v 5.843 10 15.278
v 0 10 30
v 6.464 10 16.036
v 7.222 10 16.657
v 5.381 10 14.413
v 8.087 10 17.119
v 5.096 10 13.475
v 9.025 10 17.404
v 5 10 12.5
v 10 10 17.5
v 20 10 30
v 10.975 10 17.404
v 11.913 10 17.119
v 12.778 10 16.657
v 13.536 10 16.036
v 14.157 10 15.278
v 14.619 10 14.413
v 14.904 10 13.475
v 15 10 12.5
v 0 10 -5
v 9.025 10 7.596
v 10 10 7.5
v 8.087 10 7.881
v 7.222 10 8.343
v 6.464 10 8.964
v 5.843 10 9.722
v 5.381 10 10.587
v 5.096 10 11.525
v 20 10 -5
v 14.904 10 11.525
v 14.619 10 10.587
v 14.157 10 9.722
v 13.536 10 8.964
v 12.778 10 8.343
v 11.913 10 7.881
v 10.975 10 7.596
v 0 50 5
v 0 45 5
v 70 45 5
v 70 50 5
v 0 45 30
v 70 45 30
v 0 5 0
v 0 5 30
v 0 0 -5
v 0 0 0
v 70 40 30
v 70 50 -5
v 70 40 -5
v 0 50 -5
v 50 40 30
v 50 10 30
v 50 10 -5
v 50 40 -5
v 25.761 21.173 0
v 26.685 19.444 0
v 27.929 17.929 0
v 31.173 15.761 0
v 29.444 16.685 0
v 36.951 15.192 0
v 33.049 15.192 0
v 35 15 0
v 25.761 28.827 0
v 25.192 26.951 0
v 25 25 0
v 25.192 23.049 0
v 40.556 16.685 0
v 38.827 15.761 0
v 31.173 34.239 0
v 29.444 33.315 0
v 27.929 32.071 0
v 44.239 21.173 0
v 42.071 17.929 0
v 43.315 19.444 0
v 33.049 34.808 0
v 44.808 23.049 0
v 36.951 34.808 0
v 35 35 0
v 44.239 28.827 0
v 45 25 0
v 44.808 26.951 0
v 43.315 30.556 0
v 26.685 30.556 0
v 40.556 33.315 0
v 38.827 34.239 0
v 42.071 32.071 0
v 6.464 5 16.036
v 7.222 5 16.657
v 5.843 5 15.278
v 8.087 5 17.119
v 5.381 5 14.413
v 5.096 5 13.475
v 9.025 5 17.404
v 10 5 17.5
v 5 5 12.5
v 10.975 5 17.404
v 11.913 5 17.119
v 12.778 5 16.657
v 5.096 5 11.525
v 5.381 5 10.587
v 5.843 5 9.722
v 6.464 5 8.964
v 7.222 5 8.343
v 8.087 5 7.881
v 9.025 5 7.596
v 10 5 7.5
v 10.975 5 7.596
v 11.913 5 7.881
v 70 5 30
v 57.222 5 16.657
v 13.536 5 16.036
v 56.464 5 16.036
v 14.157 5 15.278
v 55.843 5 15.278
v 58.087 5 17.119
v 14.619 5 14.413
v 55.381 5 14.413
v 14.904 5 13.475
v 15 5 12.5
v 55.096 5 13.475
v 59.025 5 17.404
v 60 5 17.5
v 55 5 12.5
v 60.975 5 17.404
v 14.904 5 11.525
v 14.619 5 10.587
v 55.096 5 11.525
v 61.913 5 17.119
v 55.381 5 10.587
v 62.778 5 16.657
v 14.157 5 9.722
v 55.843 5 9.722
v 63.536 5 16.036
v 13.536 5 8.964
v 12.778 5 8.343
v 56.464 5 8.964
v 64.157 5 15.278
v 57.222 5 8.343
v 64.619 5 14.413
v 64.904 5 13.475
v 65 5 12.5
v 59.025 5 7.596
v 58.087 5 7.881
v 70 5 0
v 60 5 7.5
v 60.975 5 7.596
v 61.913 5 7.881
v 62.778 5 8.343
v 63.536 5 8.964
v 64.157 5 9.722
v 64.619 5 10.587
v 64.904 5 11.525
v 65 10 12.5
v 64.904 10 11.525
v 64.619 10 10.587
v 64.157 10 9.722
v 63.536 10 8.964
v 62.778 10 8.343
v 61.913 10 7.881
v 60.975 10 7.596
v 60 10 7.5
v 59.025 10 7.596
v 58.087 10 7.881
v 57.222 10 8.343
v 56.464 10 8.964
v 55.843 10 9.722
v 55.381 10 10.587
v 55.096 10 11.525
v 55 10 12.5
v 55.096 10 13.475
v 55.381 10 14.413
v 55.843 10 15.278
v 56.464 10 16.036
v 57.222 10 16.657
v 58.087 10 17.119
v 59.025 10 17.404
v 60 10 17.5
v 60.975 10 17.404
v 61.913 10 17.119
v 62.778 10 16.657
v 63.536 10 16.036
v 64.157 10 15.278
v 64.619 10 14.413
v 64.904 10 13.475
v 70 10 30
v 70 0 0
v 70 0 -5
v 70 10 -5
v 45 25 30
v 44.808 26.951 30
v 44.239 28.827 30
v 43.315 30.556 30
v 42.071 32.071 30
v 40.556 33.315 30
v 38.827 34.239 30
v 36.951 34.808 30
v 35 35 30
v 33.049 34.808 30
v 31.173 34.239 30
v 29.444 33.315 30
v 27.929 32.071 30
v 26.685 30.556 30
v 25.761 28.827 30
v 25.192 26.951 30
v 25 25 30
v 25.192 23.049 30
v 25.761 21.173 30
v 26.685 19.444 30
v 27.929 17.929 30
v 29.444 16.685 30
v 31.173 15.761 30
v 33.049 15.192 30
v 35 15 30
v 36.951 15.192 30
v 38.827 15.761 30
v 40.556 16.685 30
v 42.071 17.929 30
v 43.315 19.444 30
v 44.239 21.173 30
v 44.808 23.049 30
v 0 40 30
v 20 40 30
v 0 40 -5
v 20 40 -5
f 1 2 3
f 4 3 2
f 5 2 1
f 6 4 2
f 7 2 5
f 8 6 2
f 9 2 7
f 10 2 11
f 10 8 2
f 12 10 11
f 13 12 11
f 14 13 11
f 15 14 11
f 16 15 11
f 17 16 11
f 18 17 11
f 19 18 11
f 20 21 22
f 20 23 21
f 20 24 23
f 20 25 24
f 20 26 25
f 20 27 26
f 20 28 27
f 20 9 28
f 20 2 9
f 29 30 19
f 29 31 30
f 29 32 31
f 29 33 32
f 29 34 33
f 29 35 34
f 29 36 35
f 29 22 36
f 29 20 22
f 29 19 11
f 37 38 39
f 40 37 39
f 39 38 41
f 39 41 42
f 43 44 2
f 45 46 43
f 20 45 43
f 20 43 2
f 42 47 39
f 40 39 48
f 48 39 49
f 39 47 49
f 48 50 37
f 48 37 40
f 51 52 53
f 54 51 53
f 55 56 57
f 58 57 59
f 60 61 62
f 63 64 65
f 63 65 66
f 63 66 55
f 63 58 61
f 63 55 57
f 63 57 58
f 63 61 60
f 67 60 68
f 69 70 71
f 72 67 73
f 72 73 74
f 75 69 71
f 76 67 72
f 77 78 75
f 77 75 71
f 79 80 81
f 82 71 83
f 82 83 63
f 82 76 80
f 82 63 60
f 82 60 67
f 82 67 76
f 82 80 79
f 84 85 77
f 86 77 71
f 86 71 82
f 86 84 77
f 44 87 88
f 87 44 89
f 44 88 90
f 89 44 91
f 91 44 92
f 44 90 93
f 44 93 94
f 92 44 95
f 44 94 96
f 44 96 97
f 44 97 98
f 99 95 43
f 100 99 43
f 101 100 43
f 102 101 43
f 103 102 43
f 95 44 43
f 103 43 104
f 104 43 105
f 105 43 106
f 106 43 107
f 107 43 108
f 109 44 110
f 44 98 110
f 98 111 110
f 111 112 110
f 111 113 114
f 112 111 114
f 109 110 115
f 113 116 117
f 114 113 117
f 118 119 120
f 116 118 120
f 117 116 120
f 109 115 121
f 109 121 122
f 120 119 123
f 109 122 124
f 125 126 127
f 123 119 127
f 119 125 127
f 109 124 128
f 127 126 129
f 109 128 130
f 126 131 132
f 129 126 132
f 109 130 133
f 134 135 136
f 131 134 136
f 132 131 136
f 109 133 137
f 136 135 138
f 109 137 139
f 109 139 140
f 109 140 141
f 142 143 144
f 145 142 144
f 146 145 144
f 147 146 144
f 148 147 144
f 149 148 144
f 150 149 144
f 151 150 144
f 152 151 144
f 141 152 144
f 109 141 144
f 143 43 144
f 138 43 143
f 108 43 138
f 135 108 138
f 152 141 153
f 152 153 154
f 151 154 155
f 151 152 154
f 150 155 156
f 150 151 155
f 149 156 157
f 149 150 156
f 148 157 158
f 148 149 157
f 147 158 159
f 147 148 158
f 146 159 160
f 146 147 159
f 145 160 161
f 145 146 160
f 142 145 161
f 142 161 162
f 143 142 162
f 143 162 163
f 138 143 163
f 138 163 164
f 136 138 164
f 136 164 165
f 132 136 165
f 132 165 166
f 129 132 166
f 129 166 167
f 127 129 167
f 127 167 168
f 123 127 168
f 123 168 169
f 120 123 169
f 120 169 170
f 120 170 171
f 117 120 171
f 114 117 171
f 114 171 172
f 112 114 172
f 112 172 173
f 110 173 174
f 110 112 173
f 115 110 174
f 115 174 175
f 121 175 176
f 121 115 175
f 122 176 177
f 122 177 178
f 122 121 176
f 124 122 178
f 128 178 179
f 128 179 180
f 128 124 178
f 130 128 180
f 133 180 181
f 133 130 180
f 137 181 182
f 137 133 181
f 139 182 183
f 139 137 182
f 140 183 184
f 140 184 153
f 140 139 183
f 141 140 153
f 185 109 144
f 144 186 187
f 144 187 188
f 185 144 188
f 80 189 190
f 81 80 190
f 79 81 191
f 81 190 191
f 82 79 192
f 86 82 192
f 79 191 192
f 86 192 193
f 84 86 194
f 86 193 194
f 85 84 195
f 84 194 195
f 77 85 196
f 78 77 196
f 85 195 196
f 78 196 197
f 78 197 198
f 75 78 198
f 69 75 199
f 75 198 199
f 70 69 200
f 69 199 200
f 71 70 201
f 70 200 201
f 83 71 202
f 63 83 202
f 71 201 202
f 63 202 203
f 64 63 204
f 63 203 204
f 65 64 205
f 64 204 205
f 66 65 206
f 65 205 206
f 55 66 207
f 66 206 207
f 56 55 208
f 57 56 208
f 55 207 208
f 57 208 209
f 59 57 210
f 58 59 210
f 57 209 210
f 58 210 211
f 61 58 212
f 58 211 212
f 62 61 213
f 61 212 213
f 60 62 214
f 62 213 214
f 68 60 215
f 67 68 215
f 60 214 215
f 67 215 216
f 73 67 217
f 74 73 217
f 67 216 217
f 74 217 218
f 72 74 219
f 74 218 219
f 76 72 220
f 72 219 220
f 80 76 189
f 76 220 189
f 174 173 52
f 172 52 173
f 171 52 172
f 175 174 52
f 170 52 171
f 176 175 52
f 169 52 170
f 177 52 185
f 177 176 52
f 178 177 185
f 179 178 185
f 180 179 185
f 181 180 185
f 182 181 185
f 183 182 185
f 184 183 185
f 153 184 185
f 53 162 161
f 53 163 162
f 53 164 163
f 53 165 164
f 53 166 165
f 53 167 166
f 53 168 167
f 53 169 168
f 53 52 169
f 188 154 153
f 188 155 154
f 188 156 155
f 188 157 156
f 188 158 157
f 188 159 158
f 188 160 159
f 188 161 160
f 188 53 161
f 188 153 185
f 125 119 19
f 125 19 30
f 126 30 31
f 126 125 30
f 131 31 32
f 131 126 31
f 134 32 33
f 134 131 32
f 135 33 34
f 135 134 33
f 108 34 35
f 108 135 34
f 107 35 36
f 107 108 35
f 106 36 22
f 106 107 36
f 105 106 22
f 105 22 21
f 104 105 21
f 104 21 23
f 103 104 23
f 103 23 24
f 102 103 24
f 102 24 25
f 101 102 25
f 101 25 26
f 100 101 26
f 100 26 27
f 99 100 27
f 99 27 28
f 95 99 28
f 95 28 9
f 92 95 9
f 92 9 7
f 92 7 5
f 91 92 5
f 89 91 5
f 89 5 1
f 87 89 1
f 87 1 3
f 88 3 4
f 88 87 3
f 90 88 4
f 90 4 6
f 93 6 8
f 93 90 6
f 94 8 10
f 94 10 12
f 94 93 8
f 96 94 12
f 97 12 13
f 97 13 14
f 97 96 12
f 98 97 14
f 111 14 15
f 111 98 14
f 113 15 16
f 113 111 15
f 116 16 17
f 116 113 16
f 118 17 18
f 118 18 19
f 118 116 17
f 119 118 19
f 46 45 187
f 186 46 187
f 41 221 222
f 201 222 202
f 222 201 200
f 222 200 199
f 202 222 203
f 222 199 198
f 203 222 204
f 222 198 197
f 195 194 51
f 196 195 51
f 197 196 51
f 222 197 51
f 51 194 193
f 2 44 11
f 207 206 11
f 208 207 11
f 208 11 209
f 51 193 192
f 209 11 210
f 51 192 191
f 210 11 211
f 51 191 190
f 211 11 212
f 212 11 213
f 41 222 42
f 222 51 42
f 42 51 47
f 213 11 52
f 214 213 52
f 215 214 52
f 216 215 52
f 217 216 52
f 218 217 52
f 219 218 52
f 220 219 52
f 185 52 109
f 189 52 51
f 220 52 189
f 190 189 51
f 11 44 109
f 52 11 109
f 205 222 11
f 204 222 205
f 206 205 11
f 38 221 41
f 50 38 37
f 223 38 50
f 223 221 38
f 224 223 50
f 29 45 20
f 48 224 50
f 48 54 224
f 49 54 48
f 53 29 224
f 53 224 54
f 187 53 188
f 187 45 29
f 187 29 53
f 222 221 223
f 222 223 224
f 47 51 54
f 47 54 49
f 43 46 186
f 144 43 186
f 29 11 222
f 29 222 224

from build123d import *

# Parameters (mm, degrees)
SKETCH1_W           = 70
SKETCH1_H           = 5
BOSS_EXTRUDE1_DEPTH = 10
SKETCH2_W           = 70
SKETCH2_H           = 5
BOSS_EXTRUDE2_DEPTH = 30
SKETCH3_R           = 5
CUT_EXTRUDE2_DEPTH  = 10
SKETCH4_R           = 5
CUT_EXTRUDE3_DEPTH  = 10
SKETCH6_W           = 30
SKETCH6_H           = 35
BOSS_EXTRUDE4_DEPTH = 30
BOSS_EXTRUDE5_DEPTH = 5
SKETCH8_W           = 70
SKETCH8_H           = 10
BOSS_EXTRUDE6_DEPTH = 5
SKETCH9_R           = 10
CUT_EXTRUDE4_DEPTH  = 30


with BuildPart() as part:
    # Sketch1 → Boss-Extrude1 (new body)
    with BuildSketch(Plane(origin=(0, 0, 0), x_dir=(1, 0, 0), z_dir=(0, 1, 0))):
        with Locations((35, 2.5)):
            Rectangle(SKETCH1_W, SKETCH1_H)
    extrude(amount=BOSS_EXTRUDE1_DEPTH)

    # Sketch2 → Boss-Extrude2 (add)
    with BuildSketch(Plane.XY):
        with Locations((35, 7.5)):
            Rectangle(SKETCH2_W, SKETCH2_H)
    extrude(amount=BOSS_EXTRUDE2_DEPTH)

    # Sketch3 → Cut-Extrude2 (cut)
    with BuildSketch(Plane(origin=(0, 0, 0), x_dir=(1, 0, 0), z_dir=(0, 1, 0))):
        with Locations((60, -12.5)):
            Circle(SKETCH3_R)
    extrude(amount=CUT_EXTRUDE2_DEPTH, mode=Mode.SUBTRACT)

    # Sketch4 → Cut-Extrude3 (cut)
    with BuildSketch(Plane(origin=(0, 0, 0), x_dir=(1, 0, 0), z_dir=(0, 1, 0))):
        with Locations((10, -12.5)):
            Circle(SKETCH4_R)
    extrude(amount=CUT_EXTRUDE3_DEPTH, mode=Mode.SUBTRACT)

    # Sketch6 → Boss-Extrude4 (add)
    with BuildSketch(Plane(origin=(0, 10, 0), x_dir=(1, 0, 0), z_dir=(0, 1, 0))):
        with Locations((35, -12.5)):
            Rectangle(SKETCH6_W, SKETCH6_H)
    extrude(amount=BOSS_EXTRUDE4_DEPTH)

    # Sketch7 → Boss-Extrude5 (add)
    with BuildSketch(Plane(origin=(0, 40, 0), x_dir=(1, 0, 0), z_dir=(0, 1, 0))):
        Polygon((20, 5), (0, 5), (0, -30), (70, -30), (70, 5), align=None)
    extrude(amount=BOSS_EXTRUDE5_DEPTH)

    # Sketch8 → Boss-Extrude6 (add)
    with BuildSketch(Plane(origin=(0, 45, 0), x_dir=(1, 0, 0), z_dir=(0, 1, 0))):
        with Locations((35, 0)):
            Rectangle(SKETCH8_W, SKETCH8_H)
    extrude(amount=BOSS_EXTRUDE6_DEPTH)

    # Sketch9 → Cut-Extrude4 (cut)
    with BuildSketch(Plane.XY.offset(30)):
        with Locations((35, 25)):
            Circle(SKETCH9_R)
    extrude(amount=-CUT_EXTRUDE4_DEPTH, mode=Mode.SUBTRACT)


solid = part.part
